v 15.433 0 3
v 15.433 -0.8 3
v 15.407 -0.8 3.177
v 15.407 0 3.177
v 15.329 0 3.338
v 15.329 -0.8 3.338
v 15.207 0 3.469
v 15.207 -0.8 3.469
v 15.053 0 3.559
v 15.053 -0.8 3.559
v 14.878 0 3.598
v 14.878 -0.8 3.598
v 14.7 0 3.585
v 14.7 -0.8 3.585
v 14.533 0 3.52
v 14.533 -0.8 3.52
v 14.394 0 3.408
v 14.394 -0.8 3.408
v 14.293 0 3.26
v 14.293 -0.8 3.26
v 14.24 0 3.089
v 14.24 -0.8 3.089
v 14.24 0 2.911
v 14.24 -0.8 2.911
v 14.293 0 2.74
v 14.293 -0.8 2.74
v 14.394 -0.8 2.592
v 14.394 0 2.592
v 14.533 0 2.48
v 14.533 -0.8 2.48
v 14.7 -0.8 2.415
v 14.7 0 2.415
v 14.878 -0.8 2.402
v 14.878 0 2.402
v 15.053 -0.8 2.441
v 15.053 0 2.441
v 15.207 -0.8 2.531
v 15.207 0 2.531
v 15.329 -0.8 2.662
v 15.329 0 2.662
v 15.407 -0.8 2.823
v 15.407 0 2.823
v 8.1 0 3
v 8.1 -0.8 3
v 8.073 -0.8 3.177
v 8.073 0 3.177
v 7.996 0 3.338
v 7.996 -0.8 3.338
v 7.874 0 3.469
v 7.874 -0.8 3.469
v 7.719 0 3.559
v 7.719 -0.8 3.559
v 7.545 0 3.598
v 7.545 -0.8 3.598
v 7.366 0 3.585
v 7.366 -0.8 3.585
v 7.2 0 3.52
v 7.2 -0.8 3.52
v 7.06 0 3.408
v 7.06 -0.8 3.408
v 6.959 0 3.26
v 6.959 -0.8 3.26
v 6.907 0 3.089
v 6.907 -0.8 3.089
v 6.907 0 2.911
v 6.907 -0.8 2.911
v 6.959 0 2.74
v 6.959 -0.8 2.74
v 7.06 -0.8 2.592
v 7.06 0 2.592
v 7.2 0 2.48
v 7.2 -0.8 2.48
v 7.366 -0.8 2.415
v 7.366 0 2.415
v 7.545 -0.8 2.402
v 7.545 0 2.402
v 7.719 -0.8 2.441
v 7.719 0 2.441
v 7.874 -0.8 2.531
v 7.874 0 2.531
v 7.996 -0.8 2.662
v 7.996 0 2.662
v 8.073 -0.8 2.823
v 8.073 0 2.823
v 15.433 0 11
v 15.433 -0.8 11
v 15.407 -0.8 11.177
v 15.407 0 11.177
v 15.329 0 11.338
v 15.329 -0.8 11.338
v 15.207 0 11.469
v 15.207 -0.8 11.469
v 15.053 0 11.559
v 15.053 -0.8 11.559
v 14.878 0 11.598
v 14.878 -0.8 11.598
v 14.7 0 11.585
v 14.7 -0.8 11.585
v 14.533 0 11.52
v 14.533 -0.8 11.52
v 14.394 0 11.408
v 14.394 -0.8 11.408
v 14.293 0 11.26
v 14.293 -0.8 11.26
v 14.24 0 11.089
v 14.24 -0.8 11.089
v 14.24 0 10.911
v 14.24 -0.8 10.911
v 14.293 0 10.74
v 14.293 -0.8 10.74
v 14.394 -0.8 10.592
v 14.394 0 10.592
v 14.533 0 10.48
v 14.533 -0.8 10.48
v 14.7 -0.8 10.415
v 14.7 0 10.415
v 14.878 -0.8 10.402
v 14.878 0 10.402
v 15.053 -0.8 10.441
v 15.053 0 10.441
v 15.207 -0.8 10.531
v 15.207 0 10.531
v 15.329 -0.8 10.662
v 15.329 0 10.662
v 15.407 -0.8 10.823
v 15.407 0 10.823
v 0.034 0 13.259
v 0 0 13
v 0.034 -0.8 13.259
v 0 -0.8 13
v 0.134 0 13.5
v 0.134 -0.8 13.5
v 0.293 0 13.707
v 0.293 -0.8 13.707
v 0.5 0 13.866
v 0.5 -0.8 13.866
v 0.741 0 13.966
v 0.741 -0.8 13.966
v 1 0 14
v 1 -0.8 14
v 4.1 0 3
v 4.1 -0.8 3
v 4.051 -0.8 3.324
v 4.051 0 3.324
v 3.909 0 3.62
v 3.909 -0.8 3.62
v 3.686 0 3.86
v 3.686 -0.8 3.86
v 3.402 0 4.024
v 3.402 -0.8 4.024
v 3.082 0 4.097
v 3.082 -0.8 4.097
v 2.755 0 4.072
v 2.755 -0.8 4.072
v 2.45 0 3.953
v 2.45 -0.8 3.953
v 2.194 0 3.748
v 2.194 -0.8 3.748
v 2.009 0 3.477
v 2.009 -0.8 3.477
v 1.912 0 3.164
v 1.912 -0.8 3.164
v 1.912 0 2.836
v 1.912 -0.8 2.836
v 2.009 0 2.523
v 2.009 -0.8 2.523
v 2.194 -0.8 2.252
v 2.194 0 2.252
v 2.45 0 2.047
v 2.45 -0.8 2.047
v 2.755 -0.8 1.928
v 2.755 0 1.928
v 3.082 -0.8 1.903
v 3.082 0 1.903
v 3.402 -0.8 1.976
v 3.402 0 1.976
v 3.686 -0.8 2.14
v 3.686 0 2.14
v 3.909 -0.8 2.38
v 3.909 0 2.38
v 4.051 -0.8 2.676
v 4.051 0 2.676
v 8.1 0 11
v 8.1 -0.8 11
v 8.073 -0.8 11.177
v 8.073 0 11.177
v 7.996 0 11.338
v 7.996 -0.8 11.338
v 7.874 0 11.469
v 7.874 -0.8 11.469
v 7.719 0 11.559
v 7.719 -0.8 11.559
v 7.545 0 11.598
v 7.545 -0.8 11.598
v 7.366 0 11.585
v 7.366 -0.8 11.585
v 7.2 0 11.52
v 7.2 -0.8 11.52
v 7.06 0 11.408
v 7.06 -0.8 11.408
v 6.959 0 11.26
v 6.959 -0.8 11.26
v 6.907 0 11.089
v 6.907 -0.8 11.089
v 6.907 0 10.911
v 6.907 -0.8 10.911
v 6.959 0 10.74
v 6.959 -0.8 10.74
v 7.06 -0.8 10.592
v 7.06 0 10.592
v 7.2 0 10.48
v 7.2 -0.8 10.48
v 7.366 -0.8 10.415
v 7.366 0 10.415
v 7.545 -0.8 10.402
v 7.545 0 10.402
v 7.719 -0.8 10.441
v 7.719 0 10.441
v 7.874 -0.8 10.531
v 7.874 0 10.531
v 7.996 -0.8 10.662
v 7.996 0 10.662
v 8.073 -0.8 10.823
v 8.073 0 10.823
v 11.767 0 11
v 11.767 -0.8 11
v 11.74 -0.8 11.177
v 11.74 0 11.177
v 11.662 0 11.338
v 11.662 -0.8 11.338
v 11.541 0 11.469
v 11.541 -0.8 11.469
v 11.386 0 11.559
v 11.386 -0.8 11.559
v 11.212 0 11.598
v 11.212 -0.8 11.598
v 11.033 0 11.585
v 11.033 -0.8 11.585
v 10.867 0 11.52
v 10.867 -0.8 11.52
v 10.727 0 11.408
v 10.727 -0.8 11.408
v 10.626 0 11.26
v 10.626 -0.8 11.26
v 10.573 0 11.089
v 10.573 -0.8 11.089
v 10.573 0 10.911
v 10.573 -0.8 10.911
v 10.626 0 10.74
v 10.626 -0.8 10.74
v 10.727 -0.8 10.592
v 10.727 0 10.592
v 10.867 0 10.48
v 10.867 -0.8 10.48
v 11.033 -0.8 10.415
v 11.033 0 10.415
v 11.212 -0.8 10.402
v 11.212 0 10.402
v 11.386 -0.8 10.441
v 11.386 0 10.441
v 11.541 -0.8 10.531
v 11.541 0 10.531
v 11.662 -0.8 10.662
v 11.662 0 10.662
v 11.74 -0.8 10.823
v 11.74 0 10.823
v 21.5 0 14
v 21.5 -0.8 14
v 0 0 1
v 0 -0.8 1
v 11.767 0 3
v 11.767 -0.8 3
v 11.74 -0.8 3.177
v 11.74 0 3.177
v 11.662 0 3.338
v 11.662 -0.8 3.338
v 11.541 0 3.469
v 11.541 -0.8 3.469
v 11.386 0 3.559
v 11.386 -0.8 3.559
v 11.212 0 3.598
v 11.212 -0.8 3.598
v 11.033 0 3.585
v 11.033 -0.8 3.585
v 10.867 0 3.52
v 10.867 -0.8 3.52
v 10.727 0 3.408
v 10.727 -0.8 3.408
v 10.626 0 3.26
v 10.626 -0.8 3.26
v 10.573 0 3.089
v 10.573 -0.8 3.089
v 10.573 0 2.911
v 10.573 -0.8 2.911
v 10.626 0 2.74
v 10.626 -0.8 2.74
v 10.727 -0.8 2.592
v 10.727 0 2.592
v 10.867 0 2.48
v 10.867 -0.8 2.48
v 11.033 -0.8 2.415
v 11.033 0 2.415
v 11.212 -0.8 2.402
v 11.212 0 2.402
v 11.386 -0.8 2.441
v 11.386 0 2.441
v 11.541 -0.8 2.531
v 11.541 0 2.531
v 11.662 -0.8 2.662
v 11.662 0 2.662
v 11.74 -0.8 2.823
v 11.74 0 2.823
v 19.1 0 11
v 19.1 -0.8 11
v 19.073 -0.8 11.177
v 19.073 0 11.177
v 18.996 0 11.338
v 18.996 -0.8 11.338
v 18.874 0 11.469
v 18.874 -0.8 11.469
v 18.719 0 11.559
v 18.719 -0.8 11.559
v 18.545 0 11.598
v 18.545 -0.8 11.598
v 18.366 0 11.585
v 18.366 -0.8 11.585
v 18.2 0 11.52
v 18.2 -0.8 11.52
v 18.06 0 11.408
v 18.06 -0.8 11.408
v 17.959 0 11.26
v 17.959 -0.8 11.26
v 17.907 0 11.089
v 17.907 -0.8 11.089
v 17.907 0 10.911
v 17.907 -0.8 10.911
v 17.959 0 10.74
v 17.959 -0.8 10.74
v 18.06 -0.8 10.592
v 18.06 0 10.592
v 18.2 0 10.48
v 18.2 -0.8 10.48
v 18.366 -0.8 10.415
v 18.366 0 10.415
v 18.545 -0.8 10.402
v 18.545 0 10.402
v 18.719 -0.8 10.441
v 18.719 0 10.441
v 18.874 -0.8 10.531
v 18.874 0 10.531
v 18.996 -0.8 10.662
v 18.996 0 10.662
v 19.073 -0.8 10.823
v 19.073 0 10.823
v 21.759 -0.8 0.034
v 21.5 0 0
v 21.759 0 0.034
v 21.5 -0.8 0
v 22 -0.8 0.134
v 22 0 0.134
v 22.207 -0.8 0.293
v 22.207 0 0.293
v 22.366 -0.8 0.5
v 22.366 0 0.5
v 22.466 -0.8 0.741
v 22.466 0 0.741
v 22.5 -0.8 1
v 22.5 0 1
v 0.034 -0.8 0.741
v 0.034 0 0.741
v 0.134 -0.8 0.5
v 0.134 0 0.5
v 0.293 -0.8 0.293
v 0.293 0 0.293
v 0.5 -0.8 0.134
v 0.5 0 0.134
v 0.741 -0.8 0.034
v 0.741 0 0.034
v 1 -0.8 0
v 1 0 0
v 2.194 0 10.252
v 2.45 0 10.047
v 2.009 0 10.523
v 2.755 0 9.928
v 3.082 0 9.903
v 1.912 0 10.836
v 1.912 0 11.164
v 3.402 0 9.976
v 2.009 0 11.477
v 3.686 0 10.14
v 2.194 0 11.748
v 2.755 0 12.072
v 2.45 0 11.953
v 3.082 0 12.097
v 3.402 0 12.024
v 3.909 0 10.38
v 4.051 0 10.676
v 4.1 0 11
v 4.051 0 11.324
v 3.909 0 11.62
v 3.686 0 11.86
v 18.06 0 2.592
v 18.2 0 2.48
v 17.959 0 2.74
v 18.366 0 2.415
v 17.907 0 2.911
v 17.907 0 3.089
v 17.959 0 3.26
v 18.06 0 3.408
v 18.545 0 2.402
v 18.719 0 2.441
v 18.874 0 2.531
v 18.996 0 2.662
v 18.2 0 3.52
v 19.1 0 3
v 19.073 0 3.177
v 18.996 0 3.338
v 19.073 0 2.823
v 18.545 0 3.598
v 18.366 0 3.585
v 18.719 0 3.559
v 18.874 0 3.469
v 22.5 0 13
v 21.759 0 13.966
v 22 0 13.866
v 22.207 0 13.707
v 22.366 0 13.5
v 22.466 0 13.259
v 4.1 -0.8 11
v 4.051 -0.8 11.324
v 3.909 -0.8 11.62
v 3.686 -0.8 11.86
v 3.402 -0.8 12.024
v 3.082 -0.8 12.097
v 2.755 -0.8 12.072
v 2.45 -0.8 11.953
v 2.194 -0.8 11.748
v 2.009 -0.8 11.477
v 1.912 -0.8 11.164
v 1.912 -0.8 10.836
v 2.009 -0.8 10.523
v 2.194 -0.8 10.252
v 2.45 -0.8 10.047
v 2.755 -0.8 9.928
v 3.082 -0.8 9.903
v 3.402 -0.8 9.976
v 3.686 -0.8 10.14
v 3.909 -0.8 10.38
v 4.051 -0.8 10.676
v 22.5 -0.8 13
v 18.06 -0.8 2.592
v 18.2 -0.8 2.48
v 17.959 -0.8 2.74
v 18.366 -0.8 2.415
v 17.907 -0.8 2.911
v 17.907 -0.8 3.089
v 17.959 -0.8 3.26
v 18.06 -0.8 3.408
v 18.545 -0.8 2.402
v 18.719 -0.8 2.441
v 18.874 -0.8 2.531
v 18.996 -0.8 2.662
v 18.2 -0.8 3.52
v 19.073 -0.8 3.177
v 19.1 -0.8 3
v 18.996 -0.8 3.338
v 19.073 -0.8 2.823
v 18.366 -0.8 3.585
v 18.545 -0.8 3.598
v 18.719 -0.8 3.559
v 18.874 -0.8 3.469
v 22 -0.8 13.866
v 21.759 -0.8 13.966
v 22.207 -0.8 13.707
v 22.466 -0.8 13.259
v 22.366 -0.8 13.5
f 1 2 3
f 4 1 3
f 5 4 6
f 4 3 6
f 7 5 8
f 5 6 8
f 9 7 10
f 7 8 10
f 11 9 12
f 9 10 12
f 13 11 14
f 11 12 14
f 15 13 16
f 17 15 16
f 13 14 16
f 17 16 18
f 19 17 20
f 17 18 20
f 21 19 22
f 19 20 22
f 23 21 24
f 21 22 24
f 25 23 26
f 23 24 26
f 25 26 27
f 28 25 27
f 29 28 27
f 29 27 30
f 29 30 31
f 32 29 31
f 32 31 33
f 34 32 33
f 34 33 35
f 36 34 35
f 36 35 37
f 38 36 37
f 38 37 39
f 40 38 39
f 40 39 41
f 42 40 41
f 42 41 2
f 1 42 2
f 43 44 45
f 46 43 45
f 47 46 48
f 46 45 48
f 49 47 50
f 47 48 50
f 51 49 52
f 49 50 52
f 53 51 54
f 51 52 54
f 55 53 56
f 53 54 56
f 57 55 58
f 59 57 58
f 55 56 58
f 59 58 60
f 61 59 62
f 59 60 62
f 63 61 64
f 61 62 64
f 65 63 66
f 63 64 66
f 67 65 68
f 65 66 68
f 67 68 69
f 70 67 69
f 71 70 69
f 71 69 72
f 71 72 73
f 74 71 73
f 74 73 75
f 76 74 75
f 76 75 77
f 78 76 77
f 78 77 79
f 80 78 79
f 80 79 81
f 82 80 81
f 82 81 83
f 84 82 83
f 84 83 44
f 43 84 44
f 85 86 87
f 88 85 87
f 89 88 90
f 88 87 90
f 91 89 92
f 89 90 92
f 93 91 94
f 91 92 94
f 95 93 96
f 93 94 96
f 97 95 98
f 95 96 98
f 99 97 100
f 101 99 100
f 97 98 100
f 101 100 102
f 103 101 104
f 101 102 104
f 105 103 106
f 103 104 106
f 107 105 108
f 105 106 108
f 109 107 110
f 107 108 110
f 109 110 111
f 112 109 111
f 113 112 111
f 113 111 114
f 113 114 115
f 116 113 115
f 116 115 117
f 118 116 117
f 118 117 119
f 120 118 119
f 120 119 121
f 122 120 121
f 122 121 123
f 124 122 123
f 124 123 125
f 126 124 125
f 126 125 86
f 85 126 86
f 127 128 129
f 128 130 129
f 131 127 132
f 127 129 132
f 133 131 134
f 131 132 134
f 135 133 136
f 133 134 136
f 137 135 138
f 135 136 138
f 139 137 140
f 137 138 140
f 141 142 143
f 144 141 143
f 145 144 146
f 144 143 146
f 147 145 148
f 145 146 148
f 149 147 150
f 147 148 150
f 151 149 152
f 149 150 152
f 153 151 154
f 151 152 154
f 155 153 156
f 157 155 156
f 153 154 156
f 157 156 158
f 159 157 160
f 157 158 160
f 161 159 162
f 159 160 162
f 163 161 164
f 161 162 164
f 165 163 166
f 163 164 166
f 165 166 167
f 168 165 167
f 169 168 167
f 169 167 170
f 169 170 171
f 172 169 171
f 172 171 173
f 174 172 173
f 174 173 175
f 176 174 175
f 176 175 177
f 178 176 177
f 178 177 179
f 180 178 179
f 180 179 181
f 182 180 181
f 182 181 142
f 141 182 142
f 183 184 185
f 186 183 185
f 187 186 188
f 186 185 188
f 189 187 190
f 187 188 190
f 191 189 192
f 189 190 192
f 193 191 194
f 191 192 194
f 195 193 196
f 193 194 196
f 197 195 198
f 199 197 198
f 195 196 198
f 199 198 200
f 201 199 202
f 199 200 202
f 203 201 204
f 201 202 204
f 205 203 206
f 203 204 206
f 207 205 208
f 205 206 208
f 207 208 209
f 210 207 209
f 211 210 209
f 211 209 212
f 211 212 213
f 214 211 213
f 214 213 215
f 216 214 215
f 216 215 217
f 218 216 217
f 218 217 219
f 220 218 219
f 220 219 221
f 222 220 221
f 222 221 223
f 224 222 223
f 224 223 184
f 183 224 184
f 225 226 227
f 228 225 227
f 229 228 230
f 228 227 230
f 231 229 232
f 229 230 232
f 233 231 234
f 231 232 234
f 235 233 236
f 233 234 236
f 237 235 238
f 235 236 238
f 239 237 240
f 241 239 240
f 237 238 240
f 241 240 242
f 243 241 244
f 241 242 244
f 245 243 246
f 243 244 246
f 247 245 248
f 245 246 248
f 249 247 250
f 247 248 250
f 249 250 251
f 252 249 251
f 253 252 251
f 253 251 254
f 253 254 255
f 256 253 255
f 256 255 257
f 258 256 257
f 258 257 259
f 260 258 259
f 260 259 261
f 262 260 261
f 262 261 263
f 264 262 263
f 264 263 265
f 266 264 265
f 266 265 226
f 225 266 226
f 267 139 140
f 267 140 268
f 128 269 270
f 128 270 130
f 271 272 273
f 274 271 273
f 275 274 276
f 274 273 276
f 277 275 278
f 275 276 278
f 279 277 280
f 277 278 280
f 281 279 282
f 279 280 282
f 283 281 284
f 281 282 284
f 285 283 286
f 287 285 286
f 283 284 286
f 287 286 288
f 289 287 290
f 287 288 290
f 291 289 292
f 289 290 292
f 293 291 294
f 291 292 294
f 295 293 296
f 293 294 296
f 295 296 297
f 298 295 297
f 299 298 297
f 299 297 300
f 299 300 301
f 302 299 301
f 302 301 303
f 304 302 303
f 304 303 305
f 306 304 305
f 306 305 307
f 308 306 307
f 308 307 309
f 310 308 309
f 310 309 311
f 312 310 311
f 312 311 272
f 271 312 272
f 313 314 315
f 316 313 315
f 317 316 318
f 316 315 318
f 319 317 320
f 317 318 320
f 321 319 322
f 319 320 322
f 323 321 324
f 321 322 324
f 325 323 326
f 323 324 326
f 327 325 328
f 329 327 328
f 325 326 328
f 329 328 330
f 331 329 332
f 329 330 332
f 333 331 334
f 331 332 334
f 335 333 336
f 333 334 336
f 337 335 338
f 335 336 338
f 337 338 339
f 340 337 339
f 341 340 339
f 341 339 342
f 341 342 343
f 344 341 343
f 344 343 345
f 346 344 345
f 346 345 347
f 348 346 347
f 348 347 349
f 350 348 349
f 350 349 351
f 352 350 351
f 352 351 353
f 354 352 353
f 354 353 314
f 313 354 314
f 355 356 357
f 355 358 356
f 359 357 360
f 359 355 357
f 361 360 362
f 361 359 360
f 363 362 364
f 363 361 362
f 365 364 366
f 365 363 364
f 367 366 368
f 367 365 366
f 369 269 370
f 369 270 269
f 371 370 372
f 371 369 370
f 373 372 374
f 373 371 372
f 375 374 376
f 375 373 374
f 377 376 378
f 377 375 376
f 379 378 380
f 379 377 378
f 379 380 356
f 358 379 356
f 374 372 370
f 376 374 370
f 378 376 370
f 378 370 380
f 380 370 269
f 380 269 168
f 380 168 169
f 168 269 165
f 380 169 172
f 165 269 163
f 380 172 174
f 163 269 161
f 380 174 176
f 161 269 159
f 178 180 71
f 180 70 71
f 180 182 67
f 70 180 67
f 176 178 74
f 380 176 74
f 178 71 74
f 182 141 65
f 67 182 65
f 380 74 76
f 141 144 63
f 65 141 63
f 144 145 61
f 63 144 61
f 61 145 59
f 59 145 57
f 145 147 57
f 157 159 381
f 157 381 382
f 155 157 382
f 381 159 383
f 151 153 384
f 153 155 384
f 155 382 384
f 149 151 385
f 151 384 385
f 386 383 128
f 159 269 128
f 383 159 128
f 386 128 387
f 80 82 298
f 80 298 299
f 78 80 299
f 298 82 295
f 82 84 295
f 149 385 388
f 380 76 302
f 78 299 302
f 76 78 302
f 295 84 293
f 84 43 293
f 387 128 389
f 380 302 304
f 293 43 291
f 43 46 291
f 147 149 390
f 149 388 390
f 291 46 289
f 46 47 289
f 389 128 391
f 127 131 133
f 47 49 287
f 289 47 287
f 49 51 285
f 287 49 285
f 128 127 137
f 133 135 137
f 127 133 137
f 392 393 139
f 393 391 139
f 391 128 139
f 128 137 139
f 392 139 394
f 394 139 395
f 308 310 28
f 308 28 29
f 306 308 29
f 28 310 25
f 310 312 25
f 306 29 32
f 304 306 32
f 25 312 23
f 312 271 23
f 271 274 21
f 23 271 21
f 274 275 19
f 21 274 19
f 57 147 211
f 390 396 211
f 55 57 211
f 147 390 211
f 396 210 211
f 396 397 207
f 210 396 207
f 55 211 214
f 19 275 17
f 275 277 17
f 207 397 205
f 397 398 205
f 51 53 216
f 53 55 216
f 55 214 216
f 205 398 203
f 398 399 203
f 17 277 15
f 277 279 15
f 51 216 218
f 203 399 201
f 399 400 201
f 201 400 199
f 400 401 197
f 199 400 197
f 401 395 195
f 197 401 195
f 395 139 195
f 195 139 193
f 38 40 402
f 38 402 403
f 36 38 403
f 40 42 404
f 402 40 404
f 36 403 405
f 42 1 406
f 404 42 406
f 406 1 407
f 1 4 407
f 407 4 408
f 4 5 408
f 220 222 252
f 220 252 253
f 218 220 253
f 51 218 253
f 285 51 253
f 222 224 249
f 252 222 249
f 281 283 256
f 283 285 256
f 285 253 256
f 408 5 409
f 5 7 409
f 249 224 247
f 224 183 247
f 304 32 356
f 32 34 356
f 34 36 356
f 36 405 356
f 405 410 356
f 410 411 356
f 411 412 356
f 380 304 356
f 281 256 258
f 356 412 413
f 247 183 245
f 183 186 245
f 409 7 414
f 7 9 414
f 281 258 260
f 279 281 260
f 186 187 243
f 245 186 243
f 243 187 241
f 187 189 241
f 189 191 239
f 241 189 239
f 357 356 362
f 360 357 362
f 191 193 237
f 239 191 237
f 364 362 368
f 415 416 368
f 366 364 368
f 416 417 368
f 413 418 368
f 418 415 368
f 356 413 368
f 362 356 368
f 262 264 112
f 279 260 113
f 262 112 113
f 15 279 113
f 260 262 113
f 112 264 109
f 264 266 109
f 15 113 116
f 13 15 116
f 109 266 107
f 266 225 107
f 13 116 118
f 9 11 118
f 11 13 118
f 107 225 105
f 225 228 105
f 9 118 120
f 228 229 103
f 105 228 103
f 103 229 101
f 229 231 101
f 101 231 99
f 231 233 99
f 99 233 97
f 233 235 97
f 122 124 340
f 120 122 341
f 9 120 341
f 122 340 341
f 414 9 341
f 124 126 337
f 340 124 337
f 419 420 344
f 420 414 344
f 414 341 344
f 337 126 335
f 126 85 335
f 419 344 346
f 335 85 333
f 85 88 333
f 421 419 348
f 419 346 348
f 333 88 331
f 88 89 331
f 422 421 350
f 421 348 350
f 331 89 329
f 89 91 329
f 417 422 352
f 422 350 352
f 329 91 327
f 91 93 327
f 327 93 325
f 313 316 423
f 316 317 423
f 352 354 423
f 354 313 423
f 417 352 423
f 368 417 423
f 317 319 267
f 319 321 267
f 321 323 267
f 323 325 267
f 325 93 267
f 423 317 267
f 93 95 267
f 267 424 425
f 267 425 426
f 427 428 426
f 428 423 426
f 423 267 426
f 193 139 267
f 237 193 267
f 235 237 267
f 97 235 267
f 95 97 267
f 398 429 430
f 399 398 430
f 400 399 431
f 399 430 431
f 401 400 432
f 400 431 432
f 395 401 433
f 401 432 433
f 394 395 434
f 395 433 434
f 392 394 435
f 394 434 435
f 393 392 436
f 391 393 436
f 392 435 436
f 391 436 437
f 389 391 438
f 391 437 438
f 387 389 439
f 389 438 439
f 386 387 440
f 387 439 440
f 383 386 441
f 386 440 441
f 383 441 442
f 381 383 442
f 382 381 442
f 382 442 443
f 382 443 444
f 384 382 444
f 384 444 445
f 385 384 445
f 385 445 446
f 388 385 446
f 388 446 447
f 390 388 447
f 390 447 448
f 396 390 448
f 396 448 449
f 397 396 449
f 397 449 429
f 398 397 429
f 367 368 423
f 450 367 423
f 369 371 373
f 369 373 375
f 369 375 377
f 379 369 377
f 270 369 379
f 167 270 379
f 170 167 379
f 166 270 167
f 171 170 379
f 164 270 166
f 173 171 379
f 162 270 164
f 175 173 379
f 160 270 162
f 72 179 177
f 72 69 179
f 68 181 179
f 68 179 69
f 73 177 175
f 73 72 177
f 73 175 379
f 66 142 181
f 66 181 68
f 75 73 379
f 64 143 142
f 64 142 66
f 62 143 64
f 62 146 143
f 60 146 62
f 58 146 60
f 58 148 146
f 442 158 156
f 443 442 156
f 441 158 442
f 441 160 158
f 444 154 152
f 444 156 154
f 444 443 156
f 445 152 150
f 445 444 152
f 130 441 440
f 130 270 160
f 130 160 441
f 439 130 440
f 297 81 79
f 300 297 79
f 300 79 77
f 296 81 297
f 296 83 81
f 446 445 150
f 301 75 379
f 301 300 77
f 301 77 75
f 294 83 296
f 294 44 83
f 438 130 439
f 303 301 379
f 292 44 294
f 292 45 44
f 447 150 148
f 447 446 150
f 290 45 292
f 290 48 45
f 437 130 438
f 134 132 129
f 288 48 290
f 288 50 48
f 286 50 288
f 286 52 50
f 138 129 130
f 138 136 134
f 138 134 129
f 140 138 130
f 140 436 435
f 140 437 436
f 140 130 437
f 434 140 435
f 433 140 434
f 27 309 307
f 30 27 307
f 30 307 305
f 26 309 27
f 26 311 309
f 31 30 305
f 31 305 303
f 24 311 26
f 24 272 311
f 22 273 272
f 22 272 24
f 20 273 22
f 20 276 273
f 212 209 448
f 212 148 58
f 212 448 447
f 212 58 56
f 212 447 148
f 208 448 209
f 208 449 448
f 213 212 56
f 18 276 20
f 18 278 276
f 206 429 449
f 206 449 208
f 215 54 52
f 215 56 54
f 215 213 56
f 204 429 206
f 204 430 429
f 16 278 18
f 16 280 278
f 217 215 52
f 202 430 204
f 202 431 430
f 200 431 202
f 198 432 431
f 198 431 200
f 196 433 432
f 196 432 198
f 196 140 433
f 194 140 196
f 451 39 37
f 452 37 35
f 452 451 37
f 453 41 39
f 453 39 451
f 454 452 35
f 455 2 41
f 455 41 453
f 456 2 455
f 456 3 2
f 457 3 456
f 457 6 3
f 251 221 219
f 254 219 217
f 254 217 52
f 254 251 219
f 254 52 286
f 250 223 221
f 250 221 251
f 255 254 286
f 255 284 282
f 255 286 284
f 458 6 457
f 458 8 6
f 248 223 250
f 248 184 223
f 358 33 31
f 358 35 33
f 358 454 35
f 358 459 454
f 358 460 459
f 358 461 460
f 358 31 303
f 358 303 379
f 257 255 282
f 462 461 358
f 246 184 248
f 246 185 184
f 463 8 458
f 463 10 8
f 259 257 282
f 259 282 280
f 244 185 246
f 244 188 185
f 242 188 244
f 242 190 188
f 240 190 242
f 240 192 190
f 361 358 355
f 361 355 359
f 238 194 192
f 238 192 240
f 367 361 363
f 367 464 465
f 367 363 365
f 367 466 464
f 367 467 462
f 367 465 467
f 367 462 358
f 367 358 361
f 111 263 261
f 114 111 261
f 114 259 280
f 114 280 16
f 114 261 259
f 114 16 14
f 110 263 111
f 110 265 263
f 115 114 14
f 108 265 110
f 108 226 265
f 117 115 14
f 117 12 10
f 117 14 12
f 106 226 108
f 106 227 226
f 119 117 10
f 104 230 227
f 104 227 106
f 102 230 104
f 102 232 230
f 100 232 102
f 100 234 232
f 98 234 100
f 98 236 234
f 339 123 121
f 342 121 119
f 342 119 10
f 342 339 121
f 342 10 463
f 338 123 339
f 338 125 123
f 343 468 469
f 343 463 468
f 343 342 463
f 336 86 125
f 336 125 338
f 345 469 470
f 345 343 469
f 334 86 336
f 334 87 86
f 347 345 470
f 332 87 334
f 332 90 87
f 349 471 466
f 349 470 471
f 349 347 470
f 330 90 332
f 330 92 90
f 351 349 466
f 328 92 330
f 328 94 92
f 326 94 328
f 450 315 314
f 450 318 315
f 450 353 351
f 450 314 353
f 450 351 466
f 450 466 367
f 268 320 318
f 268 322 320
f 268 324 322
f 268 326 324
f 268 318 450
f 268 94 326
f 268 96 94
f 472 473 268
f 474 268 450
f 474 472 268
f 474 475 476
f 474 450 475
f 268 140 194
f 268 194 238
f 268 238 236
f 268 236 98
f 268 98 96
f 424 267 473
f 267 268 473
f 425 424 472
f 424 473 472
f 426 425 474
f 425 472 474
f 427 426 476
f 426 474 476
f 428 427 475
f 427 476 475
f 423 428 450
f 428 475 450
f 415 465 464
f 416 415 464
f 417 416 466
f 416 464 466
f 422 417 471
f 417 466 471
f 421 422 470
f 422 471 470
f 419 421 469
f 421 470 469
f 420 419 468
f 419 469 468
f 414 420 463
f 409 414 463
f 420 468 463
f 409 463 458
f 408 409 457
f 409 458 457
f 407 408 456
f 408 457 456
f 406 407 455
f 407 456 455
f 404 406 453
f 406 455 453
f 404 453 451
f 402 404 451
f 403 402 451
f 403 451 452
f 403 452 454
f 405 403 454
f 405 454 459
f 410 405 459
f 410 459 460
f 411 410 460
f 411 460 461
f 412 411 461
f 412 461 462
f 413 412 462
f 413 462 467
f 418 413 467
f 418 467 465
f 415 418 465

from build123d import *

# Parameters (mm, degrees)
SKETCH_W            = 22.5
SKETCH_H            = 14
PAD_DEPTH           = 0.8
SKETCH001_R         = 1.1
POCKET_DEPTH        = 5
FILLET_R            = 1
SKETCH002_R         = 0.6
POCKET001_DEPTH     = 5
LINEARPATTERN_COUNT = 4
LINEARPATTERN_PITCH = 3.666667


with BuildPart() as part:
    # Sketch → Pad (new body)
    with BuildSketch(Plane.XZ):
        with Locations((11.25, 7)):
            Rectangle(SKETCH_W, SKETCH_H)
    extrude(amount=PAD_DEPTH)

    # Sketch001 (on Face6 of Pad) → Pocket (cut)
    with BuildSketch(Plane.XZ.offset(0.8)):
        with Locations((3, 11)):
            Circle(SKETCH001_R)
        with Locations((3, 3)):
            Circle(SKETCH001_R)
    extrude(amount=-POCKET_DEPTH, mode=Mode.SUBTRACT)

    # Fillet
    fillet_edges = [part.edges().sort_by_distance(p)[0] for p in [
        (0, -0.4, 14),
        (22.5, -0.4, 14),
        (22.5, -0.4, 0),
        (0, -0.4, 0),
    ]]
    fillet(fillet_edges, radius=FILLET_R)

    # Sketch002 (on Face5 of Fillet) → Pocket001 (cut)
    with BuildSketch(Plane.XZ.offset(0.8)):
        with Locations((7.5, 11)):
            Circle(SKETCH002_R)
        with Locations((7.5, 3)):
            Circle(SKETCH002_R)
    pocket001 = extrude(amount=-POCKET001_DEPTH, mode=Mode.SUBTRACT)

    # LinearPattern: Pocket001 ×4
    with Locations(*[(i * LINEARPATTERN_PITCH, 0, 0) for i in range(1, LINEARPATTERN_COUNT)]):
        add(pocket001, mode=Mode.SUBTRACT)


solid = part.part
